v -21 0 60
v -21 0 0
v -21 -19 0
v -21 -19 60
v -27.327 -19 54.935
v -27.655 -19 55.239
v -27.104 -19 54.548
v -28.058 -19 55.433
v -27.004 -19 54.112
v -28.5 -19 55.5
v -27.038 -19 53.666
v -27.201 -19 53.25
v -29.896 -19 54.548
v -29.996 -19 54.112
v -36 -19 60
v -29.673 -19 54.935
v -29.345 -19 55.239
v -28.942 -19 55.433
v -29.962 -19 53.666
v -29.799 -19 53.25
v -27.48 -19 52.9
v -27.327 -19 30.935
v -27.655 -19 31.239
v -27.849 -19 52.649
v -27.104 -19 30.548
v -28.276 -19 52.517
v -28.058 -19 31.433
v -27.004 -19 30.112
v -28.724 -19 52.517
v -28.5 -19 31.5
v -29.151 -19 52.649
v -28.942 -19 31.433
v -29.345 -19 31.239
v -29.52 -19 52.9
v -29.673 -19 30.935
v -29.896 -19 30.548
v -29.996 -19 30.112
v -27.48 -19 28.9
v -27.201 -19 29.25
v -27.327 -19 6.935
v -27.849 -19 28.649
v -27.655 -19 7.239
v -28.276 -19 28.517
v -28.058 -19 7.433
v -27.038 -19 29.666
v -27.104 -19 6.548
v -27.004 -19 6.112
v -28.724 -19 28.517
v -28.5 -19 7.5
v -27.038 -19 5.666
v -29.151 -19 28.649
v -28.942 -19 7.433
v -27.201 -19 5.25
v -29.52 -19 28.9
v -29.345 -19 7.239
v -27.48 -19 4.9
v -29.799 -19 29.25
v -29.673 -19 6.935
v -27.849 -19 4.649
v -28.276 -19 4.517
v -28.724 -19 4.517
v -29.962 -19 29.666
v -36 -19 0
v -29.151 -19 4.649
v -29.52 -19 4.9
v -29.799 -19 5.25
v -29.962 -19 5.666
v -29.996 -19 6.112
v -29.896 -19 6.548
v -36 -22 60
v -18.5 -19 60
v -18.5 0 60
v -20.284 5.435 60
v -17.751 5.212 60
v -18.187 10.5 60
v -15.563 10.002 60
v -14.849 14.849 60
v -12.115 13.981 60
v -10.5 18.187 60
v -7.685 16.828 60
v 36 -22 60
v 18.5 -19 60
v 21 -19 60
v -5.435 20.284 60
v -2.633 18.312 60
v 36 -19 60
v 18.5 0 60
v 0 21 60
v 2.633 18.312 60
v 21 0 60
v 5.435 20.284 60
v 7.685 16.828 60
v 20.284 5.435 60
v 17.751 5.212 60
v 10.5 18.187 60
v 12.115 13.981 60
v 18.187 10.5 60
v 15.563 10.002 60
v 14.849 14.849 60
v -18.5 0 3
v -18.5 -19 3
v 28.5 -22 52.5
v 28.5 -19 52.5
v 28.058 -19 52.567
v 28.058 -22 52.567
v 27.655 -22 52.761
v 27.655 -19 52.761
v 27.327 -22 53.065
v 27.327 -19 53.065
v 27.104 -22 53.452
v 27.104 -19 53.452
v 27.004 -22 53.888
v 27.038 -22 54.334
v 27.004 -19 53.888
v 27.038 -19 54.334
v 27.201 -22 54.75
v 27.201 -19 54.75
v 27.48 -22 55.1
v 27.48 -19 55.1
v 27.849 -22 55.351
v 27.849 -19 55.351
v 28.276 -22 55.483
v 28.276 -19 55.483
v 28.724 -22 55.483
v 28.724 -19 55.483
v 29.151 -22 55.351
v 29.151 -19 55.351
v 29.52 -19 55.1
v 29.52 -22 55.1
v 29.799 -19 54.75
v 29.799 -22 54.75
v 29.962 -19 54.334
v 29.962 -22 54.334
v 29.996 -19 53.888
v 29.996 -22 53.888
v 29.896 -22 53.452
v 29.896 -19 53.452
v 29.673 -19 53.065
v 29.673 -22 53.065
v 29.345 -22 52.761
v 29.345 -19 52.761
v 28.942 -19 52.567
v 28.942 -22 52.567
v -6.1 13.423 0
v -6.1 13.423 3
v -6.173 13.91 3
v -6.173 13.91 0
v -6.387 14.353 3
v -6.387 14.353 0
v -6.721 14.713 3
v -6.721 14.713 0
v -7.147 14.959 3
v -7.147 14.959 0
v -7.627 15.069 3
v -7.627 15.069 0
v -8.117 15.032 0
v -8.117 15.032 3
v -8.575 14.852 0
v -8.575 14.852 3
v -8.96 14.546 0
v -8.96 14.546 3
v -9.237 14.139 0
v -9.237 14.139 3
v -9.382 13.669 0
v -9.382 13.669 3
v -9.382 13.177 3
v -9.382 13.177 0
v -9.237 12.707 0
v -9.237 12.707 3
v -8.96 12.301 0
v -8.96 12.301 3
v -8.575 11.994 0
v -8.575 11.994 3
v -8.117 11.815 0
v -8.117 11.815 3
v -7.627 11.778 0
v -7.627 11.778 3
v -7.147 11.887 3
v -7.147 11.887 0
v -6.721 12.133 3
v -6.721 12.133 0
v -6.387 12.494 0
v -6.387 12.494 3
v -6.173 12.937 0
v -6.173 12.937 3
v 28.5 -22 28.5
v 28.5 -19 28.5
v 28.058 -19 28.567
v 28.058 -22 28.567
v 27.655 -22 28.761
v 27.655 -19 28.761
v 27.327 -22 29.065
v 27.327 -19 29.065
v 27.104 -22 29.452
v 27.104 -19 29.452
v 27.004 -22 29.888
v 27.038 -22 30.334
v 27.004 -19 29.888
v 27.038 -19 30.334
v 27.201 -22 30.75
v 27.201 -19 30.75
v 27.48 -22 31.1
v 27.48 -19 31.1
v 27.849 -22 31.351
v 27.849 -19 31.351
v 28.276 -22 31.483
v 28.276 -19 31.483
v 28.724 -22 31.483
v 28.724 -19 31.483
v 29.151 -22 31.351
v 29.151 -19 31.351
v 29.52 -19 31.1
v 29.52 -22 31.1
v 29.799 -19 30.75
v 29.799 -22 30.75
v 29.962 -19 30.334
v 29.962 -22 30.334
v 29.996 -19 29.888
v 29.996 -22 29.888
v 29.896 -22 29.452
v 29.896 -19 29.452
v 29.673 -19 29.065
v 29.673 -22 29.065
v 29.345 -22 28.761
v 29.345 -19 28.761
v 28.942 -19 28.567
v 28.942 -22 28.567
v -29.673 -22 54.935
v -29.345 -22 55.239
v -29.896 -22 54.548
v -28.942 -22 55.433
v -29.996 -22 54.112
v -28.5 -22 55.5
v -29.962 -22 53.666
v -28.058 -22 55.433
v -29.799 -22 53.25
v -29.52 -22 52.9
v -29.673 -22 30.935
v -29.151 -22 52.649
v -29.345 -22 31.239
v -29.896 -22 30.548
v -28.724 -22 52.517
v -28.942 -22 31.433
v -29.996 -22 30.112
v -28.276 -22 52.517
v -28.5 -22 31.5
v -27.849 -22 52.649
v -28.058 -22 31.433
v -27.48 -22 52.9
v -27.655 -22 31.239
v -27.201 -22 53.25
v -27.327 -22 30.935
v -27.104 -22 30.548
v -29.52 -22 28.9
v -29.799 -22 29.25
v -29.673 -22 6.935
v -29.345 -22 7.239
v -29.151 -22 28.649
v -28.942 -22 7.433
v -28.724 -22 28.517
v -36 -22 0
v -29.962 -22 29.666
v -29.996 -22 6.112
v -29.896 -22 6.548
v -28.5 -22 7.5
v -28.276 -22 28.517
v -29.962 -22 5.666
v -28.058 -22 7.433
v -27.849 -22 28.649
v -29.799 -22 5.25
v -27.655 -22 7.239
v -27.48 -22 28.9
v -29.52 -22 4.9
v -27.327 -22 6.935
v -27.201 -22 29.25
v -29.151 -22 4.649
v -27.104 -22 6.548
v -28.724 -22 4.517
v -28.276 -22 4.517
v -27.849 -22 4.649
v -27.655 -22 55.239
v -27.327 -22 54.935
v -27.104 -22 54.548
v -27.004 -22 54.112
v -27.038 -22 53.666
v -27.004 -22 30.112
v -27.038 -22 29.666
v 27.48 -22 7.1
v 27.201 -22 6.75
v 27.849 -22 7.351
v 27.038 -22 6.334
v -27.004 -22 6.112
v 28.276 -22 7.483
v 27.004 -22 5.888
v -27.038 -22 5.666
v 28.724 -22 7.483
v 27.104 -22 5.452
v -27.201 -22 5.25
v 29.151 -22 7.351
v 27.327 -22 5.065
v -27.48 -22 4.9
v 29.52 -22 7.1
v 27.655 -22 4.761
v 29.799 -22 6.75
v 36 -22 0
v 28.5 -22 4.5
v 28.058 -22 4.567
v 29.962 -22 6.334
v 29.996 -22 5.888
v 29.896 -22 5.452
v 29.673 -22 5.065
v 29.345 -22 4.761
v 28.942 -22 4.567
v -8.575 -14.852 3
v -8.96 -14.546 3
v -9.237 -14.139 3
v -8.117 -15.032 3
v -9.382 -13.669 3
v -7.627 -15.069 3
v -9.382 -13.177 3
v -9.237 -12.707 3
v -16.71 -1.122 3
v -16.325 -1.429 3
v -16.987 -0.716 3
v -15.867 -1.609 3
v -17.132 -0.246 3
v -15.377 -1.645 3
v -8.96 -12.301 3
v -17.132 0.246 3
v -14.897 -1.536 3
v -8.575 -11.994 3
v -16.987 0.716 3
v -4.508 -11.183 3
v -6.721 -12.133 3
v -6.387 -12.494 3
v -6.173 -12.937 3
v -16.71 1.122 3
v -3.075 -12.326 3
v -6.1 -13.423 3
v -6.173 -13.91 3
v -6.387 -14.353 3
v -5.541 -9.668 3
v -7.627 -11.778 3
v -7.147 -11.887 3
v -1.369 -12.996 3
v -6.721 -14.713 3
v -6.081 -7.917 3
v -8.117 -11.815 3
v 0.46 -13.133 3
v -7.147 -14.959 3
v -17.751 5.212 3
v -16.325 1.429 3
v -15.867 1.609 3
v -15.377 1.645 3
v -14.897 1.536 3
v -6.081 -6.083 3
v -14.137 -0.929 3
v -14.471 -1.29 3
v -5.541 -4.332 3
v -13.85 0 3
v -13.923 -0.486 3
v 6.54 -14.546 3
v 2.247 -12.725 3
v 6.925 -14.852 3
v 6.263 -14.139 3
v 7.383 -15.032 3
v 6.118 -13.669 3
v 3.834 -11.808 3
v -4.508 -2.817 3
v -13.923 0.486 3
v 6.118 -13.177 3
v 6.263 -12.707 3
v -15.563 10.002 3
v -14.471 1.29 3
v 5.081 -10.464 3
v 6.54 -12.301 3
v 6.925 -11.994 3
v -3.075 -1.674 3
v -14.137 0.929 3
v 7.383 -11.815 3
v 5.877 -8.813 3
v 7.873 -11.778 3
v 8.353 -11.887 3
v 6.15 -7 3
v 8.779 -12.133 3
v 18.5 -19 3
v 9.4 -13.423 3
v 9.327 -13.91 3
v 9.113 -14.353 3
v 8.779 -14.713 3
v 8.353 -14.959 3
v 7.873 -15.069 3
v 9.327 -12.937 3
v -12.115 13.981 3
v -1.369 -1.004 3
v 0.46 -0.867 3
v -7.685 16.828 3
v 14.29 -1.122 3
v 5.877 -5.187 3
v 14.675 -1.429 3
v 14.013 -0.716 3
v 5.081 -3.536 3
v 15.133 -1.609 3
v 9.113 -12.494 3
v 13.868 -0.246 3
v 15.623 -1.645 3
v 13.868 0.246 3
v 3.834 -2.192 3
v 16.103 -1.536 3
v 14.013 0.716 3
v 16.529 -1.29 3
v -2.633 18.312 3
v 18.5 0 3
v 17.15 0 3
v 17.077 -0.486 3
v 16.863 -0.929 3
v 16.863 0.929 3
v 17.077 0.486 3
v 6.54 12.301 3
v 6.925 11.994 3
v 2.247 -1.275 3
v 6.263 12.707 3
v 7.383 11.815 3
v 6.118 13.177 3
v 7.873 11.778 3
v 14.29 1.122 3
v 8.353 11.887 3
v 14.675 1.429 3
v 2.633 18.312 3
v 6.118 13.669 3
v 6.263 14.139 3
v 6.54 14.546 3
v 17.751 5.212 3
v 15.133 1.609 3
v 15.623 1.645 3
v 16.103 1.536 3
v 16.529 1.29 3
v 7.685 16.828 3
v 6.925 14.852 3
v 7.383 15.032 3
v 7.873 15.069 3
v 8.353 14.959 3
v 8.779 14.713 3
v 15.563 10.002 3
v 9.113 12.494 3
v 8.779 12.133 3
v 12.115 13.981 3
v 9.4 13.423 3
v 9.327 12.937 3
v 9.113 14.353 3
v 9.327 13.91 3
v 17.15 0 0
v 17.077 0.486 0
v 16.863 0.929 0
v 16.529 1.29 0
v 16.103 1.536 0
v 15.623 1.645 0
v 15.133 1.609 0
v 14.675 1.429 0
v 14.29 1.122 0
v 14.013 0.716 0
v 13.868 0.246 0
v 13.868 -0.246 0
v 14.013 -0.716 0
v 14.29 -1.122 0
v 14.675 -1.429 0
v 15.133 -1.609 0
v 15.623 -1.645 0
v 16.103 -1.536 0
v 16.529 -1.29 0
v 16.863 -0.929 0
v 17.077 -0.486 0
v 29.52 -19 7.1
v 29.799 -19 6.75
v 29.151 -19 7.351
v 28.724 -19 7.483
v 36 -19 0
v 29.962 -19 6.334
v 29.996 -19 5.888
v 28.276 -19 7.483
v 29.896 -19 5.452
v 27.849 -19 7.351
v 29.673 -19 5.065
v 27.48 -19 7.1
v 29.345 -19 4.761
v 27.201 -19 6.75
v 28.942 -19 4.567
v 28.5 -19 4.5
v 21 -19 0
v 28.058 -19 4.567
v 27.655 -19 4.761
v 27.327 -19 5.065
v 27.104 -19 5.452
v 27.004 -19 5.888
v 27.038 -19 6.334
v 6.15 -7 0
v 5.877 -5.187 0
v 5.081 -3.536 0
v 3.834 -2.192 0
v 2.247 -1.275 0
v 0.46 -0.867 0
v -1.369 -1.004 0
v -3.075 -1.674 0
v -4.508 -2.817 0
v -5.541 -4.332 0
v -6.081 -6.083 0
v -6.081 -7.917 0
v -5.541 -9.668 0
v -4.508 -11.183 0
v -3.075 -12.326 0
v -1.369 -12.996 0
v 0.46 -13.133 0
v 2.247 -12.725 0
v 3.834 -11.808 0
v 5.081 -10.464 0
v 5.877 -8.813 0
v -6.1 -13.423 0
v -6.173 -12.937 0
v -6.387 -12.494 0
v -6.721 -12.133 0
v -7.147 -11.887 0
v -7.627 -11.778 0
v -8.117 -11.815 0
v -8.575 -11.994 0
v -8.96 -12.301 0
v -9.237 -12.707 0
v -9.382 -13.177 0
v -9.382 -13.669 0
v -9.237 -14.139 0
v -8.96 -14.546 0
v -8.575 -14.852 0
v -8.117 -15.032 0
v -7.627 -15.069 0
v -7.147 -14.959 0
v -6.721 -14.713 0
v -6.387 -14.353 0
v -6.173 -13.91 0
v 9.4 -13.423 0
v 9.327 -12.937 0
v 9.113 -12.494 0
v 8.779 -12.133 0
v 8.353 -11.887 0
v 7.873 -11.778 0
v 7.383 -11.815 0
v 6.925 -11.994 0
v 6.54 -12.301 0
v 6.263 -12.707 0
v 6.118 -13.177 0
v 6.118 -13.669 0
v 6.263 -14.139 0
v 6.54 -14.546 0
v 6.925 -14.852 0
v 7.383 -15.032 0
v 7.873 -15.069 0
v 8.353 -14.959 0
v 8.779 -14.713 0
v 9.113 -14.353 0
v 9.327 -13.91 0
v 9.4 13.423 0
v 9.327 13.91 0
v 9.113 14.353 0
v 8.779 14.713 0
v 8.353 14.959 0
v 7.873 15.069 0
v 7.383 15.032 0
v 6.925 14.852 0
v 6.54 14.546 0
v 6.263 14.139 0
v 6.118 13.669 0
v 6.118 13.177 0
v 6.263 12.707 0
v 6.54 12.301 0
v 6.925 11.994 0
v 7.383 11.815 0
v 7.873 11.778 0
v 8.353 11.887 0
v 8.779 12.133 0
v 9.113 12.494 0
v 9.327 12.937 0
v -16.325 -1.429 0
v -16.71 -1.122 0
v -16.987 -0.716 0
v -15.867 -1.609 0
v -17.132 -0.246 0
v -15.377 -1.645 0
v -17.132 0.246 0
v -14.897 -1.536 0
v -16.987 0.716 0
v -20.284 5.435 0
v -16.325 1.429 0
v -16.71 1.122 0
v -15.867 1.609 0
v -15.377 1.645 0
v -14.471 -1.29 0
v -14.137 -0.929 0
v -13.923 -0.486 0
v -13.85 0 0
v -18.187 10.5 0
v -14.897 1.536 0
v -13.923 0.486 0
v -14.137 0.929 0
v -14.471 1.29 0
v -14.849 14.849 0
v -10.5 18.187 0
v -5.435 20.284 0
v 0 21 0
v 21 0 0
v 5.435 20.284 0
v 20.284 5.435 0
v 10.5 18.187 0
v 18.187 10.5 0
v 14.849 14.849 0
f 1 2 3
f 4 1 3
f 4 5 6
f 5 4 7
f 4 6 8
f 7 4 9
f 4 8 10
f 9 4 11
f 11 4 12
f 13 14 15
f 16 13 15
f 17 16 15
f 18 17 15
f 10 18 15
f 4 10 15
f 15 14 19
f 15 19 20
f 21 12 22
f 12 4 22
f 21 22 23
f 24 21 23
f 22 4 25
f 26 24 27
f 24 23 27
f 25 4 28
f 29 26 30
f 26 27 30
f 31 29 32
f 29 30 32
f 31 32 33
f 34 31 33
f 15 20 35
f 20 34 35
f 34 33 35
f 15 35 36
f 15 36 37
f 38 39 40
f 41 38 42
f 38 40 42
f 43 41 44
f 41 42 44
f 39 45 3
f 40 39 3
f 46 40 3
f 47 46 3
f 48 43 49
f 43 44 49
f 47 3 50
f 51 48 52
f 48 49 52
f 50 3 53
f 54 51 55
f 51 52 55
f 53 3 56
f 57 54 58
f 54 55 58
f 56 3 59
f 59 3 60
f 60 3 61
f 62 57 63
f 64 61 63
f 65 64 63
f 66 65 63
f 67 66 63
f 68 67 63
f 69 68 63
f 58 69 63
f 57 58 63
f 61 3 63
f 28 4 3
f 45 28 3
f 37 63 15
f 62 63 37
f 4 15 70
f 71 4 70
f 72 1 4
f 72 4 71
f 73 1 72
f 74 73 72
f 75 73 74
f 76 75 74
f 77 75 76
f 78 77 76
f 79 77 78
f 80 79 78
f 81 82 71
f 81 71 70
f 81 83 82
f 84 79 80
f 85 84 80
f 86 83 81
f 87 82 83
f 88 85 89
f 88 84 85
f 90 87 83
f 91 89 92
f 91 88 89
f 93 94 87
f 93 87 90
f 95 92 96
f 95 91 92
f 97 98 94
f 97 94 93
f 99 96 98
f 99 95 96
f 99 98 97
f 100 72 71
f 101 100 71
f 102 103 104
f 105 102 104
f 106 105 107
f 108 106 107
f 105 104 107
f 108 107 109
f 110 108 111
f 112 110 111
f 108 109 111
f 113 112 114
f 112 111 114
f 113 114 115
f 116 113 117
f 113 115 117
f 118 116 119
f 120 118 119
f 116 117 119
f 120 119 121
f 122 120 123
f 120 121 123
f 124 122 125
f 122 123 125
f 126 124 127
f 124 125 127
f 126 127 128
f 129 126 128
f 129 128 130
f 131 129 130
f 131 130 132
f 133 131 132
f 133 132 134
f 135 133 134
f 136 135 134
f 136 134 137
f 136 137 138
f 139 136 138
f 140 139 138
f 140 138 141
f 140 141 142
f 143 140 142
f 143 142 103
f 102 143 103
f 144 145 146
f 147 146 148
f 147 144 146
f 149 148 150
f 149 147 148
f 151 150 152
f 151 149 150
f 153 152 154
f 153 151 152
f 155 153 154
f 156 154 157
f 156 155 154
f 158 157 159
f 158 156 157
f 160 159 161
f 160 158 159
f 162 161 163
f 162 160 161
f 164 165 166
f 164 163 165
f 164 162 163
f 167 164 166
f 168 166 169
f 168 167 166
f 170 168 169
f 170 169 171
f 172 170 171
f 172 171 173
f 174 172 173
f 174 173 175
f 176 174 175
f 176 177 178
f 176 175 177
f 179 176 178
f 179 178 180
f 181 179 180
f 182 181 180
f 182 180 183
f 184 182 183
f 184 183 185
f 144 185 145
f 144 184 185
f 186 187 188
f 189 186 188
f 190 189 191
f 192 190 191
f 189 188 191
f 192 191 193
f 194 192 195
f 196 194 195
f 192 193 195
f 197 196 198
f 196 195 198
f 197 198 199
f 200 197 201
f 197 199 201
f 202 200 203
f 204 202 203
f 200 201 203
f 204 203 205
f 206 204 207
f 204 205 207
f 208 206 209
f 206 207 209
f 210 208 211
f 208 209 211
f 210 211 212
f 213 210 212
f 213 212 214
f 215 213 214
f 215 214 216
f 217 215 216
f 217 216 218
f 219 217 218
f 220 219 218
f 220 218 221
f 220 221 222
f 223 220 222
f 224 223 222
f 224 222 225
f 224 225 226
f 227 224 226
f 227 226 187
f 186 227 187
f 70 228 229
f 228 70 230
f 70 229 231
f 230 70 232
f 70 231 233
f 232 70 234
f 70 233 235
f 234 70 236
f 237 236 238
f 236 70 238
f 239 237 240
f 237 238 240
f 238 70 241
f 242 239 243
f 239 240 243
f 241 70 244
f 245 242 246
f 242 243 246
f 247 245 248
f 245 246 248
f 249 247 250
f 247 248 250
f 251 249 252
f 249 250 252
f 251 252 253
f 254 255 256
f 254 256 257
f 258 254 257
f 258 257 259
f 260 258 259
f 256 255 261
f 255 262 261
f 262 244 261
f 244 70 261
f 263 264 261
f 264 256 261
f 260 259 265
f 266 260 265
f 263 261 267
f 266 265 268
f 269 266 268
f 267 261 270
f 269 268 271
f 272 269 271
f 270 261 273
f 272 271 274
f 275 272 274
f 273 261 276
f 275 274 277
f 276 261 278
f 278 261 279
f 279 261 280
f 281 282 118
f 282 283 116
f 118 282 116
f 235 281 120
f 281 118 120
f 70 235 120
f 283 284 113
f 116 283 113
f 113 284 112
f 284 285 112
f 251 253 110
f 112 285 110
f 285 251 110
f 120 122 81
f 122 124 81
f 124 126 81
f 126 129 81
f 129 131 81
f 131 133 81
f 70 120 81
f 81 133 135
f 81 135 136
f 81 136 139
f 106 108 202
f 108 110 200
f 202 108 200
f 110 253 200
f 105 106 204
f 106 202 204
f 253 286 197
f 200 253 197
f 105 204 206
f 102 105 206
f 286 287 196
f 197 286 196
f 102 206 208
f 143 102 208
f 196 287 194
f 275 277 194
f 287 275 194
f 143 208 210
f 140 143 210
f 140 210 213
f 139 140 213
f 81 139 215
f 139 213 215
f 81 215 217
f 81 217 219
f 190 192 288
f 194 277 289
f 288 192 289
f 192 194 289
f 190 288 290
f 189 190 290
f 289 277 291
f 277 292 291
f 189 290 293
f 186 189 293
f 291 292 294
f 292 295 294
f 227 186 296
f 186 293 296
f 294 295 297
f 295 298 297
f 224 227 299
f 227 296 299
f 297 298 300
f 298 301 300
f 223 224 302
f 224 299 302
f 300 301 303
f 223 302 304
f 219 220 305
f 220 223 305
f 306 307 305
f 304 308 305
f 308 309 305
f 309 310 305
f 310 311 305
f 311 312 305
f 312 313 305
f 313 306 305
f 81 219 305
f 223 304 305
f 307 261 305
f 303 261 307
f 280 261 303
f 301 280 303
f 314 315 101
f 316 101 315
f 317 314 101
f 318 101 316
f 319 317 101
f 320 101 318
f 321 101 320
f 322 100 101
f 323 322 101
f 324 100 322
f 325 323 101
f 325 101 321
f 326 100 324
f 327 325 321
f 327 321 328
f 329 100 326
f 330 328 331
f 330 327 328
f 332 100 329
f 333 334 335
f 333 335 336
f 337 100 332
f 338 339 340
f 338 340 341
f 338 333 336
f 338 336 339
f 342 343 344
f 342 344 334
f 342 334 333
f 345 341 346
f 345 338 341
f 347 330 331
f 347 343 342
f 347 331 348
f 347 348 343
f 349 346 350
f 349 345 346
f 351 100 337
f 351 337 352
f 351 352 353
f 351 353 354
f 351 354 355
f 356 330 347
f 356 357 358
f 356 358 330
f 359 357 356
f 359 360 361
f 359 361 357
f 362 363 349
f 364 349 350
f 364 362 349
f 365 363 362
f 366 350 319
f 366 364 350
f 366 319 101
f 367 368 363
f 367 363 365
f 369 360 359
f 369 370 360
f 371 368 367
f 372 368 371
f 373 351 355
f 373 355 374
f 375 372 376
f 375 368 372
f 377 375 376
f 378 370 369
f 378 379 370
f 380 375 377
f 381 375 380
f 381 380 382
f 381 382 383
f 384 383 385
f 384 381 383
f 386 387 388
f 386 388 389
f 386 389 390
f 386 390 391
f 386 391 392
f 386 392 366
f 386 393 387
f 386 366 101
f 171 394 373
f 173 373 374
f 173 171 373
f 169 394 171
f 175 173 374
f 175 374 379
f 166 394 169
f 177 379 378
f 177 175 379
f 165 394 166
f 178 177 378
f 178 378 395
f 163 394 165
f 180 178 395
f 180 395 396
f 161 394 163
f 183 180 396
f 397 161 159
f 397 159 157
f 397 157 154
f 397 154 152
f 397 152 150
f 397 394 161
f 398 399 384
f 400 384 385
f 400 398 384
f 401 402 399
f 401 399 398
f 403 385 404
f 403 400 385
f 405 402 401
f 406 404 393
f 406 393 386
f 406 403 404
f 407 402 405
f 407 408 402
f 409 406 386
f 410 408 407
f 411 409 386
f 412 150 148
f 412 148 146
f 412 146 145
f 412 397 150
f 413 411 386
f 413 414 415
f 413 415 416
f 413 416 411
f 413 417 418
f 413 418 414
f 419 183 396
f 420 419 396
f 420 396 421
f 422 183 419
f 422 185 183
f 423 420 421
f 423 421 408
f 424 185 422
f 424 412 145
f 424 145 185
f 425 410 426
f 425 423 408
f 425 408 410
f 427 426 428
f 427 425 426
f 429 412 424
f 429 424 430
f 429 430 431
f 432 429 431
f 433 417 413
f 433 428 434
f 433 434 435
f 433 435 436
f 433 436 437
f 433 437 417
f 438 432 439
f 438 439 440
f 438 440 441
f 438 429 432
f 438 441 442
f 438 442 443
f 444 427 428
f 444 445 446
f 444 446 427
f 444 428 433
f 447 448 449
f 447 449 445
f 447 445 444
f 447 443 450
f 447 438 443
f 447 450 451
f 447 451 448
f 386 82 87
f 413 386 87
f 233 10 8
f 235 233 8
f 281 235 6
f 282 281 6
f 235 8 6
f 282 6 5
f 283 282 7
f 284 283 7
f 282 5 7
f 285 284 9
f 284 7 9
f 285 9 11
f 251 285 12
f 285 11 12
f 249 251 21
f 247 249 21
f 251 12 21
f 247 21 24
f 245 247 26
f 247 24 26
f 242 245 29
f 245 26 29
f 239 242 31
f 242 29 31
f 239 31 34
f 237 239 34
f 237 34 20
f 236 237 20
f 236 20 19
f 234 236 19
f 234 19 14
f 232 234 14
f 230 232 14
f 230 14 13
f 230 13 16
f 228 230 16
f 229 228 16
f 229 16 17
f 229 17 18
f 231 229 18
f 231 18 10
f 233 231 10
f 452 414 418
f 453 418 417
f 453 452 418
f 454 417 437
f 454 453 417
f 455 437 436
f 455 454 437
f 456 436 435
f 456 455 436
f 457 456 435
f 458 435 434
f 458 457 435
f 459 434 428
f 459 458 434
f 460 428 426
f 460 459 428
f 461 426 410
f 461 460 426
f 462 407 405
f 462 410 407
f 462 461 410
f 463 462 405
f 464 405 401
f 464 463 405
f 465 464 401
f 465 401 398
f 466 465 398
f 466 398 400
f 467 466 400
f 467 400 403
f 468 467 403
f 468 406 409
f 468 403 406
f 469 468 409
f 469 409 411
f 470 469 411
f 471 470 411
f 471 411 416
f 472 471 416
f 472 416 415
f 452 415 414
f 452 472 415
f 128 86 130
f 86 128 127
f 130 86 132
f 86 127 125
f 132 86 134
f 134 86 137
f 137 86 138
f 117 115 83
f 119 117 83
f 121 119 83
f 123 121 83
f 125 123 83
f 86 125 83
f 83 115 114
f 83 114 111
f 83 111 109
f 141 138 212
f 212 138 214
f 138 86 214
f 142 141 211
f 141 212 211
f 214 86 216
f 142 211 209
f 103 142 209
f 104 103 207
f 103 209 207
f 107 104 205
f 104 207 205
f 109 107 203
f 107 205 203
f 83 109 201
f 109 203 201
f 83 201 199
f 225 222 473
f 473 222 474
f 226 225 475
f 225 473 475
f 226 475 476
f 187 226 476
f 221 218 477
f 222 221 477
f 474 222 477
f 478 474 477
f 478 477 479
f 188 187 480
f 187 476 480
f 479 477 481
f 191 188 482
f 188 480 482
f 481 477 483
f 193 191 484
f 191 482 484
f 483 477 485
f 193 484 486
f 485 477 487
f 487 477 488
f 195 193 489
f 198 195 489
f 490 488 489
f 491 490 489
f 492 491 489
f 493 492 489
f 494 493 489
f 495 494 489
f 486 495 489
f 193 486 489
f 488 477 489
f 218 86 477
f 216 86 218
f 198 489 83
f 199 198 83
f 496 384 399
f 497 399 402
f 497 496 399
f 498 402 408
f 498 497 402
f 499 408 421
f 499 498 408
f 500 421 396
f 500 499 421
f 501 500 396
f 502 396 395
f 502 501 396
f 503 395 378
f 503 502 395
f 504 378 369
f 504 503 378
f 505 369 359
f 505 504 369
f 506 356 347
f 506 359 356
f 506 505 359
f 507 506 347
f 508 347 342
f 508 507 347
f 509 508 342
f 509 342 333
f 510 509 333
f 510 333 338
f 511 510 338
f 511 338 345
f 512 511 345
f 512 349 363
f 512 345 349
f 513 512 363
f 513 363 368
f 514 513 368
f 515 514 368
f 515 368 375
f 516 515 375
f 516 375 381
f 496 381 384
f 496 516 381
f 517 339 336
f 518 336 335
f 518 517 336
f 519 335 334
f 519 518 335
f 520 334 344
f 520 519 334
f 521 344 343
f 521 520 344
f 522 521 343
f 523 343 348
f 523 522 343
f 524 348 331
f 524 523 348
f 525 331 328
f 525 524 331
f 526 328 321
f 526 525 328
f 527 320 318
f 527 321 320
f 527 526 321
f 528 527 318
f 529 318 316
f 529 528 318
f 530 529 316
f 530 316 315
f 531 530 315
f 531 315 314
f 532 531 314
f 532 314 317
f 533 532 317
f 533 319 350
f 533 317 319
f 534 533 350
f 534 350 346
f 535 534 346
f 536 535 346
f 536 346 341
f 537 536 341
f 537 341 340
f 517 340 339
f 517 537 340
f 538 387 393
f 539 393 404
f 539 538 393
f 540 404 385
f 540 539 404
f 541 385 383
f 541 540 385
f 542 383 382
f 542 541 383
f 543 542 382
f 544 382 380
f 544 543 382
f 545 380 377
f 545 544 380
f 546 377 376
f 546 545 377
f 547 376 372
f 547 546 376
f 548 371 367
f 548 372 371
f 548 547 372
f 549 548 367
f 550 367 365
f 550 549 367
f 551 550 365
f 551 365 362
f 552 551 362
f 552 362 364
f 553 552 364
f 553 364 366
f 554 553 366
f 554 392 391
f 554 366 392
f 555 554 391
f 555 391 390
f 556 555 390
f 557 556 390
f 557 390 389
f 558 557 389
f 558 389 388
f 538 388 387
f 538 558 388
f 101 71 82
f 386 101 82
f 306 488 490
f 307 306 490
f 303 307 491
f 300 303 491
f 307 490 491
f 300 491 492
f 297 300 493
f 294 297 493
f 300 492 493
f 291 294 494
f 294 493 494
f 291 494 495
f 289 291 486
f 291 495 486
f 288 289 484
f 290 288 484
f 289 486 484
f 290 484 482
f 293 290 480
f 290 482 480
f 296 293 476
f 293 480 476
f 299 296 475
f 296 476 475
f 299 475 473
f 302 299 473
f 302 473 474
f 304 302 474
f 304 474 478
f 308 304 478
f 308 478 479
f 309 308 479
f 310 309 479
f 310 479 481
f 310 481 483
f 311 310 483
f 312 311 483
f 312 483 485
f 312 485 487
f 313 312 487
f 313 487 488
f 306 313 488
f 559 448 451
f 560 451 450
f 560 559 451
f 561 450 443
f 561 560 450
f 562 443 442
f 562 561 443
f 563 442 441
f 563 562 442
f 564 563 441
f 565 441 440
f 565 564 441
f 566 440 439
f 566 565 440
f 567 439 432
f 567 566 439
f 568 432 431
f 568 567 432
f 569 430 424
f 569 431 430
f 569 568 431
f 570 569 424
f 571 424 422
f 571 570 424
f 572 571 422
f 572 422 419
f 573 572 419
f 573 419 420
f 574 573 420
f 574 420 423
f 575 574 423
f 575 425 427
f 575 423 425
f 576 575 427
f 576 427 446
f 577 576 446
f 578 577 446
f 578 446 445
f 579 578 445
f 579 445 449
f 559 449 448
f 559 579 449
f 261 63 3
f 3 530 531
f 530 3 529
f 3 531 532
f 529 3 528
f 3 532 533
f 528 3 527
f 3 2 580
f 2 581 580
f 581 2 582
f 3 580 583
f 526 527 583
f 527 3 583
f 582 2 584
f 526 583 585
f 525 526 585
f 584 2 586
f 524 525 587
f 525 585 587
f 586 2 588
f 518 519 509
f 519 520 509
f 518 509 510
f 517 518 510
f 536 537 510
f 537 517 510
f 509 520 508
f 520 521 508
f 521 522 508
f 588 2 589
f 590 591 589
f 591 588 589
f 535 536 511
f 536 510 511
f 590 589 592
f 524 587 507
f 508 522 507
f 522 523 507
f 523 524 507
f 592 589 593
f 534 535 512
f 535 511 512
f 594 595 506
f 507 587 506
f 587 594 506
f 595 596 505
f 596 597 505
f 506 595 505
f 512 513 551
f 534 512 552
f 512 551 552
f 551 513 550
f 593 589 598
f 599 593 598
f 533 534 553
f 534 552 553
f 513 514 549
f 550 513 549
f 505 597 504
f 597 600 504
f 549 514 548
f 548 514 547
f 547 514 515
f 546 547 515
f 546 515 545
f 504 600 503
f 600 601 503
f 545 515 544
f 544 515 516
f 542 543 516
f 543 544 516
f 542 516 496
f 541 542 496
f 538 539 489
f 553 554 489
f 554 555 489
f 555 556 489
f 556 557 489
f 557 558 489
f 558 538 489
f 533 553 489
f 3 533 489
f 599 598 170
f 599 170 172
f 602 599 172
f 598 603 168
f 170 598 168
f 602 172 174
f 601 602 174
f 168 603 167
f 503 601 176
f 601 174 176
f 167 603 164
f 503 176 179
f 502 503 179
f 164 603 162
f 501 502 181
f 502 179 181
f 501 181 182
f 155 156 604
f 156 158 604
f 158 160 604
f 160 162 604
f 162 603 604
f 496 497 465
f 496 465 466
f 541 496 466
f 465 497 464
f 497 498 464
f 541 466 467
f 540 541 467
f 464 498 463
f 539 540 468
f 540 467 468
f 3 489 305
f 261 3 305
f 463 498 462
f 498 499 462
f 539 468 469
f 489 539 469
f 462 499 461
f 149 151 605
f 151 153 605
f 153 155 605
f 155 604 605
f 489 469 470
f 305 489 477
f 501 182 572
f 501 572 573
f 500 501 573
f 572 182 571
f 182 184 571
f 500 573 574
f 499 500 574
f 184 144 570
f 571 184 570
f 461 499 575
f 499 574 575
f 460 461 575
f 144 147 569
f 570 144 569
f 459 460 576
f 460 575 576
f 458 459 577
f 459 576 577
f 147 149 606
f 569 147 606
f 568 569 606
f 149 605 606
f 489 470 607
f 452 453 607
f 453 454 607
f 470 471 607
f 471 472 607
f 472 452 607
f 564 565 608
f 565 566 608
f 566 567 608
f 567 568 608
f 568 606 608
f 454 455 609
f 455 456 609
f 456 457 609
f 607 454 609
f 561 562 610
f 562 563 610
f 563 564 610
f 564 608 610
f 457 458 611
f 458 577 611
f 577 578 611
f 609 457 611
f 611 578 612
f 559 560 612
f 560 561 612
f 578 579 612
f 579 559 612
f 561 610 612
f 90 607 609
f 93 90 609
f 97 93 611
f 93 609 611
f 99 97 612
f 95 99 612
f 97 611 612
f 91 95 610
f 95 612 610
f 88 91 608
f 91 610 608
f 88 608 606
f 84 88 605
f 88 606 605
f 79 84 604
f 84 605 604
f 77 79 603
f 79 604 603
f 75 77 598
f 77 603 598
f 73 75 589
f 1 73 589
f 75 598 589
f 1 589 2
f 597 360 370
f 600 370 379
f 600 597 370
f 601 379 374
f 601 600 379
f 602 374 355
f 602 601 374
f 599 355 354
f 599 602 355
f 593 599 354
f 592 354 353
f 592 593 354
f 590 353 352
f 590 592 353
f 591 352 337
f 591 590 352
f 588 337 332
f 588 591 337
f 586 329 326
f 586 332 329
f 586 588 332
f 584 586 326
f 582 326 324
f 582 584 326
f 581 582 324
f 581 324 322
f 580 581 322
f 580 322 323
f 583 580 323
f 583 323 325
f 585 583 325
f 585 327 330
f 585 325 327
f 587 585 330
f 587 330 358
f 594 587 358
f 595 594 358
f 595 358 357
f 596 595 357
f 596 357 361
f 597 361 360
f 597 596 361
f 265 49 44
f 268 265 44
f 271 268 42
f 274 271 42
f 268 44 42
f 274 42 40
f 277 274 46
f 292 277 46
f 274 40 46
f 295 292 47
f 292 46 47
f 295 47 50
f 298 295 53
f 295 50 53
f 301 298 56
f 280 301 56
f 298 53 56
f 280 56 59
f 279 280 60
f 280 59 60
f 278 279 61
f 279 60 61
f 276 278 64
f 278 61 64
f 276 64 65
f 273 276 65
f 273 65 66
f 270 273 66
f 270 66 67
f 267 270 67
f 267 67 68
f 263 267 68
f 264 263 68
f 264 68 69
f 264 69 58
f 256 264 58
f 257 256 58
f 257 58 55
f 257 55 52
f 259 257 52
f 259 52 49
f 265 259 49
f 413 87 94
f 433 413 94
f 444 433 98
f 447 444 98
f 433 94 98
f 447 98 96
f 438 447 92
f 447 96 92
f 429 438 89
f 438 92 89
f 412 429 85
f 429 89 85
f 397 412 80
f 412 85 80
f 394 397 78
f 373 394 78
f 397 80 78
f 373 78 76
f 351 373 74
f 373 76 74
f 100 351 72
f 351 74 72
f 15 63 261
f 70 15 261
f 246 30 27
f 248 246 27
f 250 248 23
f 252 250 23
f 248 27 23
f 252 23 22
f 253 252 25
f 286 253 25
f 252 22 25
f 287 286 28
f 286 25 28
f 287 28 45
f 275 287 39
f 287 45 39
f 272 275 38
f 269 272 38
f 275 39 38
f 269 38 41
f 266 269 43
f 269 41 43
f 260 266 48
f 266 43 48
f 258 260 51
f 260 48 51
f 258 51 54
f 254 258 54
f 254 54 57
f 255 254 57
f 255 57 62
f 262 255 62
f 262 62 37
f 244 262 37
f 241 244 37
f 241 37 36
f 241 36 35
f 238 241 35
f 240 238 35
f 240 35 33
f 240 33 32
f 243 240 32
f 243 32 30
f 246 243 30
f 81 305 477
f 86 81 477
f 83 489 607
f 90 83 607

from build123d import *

# Parameters (mm, degrees)
SKETCH1_R           = 6.15
SKETCH1_R_2         = 1.65
BOSS_EXTRUDE1_DEPTH = 60
CUT_EXTRUDE1_DEPTH  = 57
SKETCH3_R           = 1.5
CUT_EXTRUDE2_DEPTH  = 81.597766718


with BuildPart() as part:
    # Sketch1 → Boss-Extrude1 (new body)
    with BuildSketch(Plane.XY):
        with BuildLine():
            Line((-21, 0), (-21, -19))
            Line((-21, -19), (-36, -19))
            Line((-36, -19), (-36, -22))
            Line((-36, -22), (36, -22))
            Line((36, -22), (36, -19))
            Line((36, -19), (21, -19))
            Line((21, -19), (21, 0))
            ThreePointArc((21, 0), (0, 21), (-21, 0))
        make_face()
        with Locations((0, -7)):
            Circle(SKETCH1_R, mode=Mode.SUBTRACT)
        with Locations((-15.5, 0)):
            Circle(SKETCH1_R_2, mode=Mode.SUBTRACT)
        with Locations((-7.75, 13.423393759)):
            Circle(SKETCH1_R_2, mode=Mode.SUBTRACT)
        with Locations((7.75, 13.423393759)):
            Circle(SKETCH1_R_2, mode=Mode.SUBTRACT)
        with Locations((15.5, 0)):
            Circle(SKETCH1_R_2, mode=Mode.SUBTRACT)
        with Locations((7.75, -13.423393759)):
            Circle(SKETCH1_R_2, mode=Mode.SUBTRACT)
        with Locations((-7.75, -13.423393759)):
            Circle(SKETCH1_R_2, mode=Mode.SUBTRACT)
    extrude(amount=BOSS_EXTRUDE1_DEPTH)

    # Sketch2 → Cut-Extrude1 (cut)
    with BuildSketch(Plane.XY.offset(60)):
        with BuildLine():
            Line((-18.5, 0), (-18.5, -19))
            Line((-18.5, -19), (18.5, -19))
            Line((18.5, -19), (18.5, 0))
            ThreePointArc((18.5, 0), (0, 18.5), (-18.5, 0))
        make_face()
    extrude(amount=-CUT_EXTRUDE1_DEPTH, mode=Mode.SUBTRACT)

    # Sketch3 → Cut-Extrude2 (cut, through all)
    with BuildSketch(Plane(origin=(0, -19, 0), x_dir=(1, 0, 0), z_dir=(0, 1, 0))):
        with Locations(Location((-28.5, -30, 0), (0, 0, 270))):
            Circle(SKETCH3_R)
        with Locations(Location((-28.5, -6, 0), (0, 0, 270))):
            Circle(SKETCH3_R)
        with Locations(Location((-28.5, -54, 0), (0, 0, 270))):
            Circle(SKETCH3_R)
        with Locations(Location((28.5, -54, 0), (0, 0, 90))):
            Circle(SKETCH3_R)
        with Locations(Location((28.5, -6, 0), (0, 0, 90))):
            Circle(SKETCH3_R)
        with Locations(Location((28.5, -30, 0), (0, 0, 90))):
            Circle(SKETCH3_R)
    extrude(amount=-CUT_EXTRUDE2_DEPTH, mode=Mode.SUBTRACT)


solid = part.part
